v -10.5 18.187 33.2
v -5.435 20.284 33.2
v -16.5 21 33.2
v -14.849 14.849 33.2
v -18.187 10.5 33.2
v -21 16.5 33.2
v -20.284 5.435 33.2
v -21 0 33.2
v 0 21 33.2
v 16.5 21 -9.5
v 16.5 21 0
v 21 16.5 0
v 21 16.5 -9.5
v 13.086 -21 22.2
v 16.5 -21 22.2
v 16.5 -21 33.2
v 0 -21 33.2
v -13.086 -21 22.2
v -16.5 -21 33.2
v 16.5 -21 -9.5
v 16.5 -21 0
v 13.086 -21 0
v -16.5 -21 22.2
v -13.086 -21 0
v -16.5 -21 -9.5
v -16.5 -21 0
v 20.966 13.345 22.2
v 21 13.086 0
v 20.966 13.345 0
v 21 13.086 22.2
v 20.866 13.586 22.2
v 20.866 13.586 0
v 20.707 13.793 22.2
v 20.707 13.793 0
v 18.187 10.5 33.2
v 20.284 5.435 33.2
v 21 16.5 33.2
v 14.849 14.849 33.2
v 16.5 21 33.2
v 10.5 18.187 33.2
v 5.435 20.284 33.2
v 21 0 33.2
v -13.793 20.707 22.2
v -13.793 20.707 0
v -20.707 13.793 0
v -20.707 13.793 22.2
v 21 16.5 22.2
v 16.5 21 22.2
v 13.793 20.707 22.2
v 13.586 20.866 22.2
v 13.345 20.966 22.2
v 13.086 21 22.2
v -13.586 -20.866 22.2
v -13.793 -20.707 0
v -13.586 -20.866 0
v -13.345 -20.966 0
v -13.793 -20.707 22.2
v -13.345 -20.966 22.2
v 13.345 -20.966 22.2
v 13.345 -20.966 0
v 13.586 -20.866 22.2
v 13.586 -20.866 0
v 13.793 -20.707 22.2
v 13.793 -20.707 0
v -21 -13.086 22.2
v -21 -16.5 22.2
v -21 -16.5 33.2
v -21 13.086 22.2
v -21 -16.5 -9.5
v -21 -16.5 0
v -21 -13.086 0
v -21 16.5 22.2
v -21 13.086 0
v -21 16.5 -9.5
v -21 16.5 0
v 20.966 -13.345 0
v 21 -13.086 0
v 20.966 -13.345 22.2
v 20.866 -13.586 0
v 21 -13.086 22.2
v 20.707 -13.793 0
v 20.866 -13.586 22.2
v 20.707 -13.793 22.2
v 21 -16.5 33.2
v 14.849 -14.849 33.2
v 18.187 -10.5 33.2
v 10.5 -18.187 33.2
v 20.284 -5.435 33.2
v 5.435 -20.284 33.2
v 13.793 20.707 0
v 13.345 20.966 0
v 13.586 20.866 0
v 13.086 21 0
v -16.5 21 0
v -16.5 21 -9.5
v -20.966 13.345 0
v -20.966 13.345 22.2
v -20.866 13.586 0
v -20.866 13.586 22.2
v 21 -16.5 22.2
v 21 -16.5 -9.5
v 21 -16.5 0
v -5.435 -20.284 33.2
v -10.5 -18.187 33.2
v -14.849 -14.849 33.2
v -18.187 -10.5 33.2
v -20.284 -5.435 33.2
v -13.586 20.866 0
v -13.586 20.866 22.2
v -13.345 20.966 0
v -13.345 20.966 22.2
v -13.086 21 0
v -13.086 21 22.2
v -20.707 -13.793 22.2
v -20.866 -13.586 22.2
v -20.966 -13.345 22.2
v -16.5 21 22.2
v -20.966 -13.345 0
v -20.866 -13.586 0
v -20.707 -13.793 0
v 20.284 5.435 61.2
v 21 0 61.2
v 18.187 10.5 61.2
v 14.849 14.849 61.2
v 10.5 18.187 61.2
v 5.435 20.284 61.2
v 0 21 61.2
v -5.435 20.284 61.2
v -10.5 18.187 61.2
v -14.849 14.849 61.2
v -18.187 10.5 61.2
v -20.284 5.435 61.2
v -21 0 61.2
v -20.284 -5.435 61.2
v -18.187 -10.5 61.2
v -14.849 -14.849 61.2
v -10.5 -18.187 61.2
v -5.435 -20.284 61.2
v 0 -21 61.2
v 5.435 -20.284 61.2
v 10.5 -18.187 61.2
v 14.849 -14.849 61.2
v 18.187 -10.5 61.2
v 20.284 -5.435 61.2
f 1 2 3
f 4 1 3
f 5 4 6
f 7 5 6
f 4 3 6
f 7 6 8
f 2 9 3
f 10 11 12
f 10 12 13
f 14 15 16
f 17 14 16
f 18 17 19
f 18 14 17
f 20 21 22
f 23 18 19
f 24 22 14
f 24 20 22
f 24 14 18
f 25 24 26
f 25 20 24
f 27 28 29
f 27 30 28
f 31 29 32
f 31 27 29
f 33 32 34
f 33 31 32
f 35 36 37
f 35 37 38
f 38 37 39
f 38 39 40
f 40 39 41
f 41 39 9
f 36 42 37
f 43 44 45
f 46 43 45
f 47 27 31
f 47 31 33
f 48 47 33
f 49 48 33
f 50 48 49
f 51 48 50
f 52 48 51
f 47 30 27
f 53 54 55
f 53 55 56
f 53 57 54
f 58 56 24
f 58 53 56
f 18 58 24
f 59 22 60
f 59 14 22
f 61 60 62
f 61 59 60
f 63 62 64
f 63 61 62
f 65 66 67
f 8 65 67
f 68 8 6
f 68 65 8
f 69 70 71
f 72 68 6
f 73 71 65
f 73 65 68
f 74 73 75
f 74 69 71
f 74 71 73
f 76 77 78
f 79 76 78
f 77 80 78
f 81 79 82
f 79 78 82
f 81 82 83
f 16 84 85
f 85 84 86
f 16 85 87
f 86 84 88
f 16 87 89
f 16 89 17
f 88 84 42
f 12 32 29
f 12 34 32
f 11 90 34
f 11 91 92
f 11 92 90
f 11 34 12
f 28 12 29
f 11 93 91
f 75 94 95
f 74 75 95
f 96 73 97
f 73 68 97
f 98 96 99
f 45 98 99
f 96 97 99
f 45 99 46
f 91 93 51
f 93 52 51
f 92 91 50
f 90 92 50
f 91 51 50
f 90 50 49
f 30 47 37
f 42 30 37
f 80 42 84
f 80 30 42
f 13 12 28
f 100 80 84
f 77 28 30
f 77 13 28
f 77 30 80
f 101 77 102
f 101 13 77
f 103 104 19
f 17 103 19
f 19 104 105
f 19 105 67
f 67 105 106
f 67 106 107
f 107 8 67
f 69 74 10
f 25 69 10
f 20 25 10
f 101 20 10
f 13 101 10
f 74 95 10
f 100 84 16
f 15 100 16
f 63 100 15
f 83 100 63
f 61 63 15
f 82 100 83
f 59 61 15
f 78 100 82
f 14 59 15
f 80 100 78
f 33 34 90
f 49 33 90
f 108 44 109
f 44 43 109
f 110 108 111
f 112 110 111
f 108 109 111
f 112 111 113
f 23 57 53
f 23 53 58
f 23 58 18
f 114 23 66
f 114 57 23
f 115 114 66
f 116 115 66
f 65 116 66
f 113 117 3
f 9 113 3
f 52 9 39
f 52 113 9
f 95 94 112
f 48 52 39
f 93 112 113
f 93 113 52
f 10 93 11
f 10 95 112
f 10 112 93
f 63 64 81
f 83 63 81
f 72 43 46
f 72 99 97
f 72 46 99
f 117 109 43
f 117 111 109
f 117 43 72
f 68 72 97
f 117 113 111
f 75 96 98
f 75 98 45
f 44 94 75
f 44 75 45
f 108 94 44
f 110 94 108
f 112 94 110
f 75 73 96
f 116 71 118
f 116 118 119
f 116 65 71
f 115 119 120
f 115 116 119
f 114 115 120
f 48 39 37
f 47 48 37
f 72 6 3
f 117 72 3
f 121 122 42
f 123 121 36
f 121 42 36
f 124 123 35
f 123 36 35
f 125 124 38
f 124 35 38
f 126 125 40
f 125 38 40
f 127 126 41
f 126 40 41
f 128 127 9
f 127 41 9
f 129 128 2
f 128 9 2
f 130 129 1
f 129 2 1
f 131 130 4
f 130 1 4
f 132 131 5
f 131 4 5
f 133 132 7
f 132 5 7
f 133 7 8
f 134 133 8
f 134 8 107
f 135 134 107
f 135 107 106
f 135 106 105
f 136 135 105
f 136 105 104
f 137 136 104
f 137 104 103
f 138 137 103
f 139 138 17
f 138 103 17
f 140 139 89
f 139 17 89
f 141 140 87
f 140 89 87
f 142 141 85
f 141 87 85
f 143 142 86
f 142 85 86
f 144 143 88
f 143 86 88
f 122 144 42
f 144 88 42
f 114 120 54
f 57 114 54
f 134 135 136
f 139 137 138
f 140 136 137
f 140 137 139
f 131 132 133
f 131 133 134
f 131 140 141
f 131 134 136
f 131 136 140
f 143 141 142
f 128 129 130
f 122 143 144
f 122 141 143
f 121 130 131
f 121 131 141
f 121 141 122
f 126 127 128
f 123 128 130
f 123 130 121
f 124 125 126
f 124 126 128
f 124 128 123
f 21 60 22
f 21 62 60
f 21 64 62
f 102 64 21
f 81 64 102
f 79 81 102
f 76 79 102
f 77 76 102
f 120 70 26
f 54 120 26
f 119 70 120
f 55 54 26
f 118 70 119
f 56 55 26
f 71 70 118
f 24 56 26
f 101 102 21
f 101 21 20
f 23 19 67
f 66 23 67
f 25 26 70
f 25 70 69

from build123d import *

# Parameters (mm, degrees)
SKETCH1_W           = 42
SKETCH1_H           = 42
BOSS_EXTRUDE1_DEPTH = 9.5
CHAMFER1_SIZE       = 4.5
BOSS_EXTRUDE2_DEPTH = 22.2
FILLET1_R           = 1
BOSS_EXTRUDE3_DEPTH = 11
SKETCH5_R           = 21
BOSS_EXTRUDE4_DEPTH = 28


with BuildPart() as part:
    # Sketch1 → Boss-Extrude1 (new body)
    with BuildSketch(Plane.XY):
        Rectangle(SKETCH1_W, SKETCH1_H)
    extrude(amount=-BOSS_EXTRUDE1_DEPTH)

    # Chamfer1
    chamfer1_edges = [part.edges().sort_by_distance(p)[0] for p in [
        (21, -21, -4.75),
        (-21, -21, -4.75),
        (-21, 21, -4.75),
        (21, 21, -4.75),
    ]]
    chamfer(chamfer1_edges, length=CHAMFER1_SIZE)

    # Sketch3 → Boss-Extrude2 (add)
    with BuildSketch(Plane.XY):
        Polygon((13.5, 21), (-13.5, 21), (-21, 13.5), (-21, -13.5), (-13.5, -21), (13.5, -21), (21, -13.5), (21, 13.5), align=None)
    extrude(amount=BOSS_EXTRUDE2_DEPTH)

    # Fillet1
    fillet1_edges = [part.edges().sort_by_distance(p)[0] for p in [
        (-13.5, 21, 11.1),
        (-21, 13.5, 11.1),
        (-21, -13.5, 11.1),
        (-13.5, -21, 11.1),
        (13.5, -21, 11.1),
        (21, -13.5, 11.1),
        (21, 13.5, 11.1),
        (13.5, 21, 11.1),
    ]]
    fillet(fillet1_edges, radius=FILLET1_R)

    # Sketch4 → Boss-Extrude3 (add)
    with BuildSketch(Plane.XY.offset(22.2)):
        Polygon((-21, 16.5), (-16.5, 21), (16.5, 21), (21, 16.5), (21, -16.5), (16.5, -21), (-16.5, -21), (-21, -16.5), align=None)
    extrude(amount=BOSS_EXTRUDE3_DEPTH)

    # Sketch5 → Boss-Extrude4 (add)
    with BuildSketch(Plane.XY.offset(33.2)):
        Circle(SKETCH5_R)
    extrude(amount=BOSS_EXTRUDE4_DEPTH)


solid = part.part
